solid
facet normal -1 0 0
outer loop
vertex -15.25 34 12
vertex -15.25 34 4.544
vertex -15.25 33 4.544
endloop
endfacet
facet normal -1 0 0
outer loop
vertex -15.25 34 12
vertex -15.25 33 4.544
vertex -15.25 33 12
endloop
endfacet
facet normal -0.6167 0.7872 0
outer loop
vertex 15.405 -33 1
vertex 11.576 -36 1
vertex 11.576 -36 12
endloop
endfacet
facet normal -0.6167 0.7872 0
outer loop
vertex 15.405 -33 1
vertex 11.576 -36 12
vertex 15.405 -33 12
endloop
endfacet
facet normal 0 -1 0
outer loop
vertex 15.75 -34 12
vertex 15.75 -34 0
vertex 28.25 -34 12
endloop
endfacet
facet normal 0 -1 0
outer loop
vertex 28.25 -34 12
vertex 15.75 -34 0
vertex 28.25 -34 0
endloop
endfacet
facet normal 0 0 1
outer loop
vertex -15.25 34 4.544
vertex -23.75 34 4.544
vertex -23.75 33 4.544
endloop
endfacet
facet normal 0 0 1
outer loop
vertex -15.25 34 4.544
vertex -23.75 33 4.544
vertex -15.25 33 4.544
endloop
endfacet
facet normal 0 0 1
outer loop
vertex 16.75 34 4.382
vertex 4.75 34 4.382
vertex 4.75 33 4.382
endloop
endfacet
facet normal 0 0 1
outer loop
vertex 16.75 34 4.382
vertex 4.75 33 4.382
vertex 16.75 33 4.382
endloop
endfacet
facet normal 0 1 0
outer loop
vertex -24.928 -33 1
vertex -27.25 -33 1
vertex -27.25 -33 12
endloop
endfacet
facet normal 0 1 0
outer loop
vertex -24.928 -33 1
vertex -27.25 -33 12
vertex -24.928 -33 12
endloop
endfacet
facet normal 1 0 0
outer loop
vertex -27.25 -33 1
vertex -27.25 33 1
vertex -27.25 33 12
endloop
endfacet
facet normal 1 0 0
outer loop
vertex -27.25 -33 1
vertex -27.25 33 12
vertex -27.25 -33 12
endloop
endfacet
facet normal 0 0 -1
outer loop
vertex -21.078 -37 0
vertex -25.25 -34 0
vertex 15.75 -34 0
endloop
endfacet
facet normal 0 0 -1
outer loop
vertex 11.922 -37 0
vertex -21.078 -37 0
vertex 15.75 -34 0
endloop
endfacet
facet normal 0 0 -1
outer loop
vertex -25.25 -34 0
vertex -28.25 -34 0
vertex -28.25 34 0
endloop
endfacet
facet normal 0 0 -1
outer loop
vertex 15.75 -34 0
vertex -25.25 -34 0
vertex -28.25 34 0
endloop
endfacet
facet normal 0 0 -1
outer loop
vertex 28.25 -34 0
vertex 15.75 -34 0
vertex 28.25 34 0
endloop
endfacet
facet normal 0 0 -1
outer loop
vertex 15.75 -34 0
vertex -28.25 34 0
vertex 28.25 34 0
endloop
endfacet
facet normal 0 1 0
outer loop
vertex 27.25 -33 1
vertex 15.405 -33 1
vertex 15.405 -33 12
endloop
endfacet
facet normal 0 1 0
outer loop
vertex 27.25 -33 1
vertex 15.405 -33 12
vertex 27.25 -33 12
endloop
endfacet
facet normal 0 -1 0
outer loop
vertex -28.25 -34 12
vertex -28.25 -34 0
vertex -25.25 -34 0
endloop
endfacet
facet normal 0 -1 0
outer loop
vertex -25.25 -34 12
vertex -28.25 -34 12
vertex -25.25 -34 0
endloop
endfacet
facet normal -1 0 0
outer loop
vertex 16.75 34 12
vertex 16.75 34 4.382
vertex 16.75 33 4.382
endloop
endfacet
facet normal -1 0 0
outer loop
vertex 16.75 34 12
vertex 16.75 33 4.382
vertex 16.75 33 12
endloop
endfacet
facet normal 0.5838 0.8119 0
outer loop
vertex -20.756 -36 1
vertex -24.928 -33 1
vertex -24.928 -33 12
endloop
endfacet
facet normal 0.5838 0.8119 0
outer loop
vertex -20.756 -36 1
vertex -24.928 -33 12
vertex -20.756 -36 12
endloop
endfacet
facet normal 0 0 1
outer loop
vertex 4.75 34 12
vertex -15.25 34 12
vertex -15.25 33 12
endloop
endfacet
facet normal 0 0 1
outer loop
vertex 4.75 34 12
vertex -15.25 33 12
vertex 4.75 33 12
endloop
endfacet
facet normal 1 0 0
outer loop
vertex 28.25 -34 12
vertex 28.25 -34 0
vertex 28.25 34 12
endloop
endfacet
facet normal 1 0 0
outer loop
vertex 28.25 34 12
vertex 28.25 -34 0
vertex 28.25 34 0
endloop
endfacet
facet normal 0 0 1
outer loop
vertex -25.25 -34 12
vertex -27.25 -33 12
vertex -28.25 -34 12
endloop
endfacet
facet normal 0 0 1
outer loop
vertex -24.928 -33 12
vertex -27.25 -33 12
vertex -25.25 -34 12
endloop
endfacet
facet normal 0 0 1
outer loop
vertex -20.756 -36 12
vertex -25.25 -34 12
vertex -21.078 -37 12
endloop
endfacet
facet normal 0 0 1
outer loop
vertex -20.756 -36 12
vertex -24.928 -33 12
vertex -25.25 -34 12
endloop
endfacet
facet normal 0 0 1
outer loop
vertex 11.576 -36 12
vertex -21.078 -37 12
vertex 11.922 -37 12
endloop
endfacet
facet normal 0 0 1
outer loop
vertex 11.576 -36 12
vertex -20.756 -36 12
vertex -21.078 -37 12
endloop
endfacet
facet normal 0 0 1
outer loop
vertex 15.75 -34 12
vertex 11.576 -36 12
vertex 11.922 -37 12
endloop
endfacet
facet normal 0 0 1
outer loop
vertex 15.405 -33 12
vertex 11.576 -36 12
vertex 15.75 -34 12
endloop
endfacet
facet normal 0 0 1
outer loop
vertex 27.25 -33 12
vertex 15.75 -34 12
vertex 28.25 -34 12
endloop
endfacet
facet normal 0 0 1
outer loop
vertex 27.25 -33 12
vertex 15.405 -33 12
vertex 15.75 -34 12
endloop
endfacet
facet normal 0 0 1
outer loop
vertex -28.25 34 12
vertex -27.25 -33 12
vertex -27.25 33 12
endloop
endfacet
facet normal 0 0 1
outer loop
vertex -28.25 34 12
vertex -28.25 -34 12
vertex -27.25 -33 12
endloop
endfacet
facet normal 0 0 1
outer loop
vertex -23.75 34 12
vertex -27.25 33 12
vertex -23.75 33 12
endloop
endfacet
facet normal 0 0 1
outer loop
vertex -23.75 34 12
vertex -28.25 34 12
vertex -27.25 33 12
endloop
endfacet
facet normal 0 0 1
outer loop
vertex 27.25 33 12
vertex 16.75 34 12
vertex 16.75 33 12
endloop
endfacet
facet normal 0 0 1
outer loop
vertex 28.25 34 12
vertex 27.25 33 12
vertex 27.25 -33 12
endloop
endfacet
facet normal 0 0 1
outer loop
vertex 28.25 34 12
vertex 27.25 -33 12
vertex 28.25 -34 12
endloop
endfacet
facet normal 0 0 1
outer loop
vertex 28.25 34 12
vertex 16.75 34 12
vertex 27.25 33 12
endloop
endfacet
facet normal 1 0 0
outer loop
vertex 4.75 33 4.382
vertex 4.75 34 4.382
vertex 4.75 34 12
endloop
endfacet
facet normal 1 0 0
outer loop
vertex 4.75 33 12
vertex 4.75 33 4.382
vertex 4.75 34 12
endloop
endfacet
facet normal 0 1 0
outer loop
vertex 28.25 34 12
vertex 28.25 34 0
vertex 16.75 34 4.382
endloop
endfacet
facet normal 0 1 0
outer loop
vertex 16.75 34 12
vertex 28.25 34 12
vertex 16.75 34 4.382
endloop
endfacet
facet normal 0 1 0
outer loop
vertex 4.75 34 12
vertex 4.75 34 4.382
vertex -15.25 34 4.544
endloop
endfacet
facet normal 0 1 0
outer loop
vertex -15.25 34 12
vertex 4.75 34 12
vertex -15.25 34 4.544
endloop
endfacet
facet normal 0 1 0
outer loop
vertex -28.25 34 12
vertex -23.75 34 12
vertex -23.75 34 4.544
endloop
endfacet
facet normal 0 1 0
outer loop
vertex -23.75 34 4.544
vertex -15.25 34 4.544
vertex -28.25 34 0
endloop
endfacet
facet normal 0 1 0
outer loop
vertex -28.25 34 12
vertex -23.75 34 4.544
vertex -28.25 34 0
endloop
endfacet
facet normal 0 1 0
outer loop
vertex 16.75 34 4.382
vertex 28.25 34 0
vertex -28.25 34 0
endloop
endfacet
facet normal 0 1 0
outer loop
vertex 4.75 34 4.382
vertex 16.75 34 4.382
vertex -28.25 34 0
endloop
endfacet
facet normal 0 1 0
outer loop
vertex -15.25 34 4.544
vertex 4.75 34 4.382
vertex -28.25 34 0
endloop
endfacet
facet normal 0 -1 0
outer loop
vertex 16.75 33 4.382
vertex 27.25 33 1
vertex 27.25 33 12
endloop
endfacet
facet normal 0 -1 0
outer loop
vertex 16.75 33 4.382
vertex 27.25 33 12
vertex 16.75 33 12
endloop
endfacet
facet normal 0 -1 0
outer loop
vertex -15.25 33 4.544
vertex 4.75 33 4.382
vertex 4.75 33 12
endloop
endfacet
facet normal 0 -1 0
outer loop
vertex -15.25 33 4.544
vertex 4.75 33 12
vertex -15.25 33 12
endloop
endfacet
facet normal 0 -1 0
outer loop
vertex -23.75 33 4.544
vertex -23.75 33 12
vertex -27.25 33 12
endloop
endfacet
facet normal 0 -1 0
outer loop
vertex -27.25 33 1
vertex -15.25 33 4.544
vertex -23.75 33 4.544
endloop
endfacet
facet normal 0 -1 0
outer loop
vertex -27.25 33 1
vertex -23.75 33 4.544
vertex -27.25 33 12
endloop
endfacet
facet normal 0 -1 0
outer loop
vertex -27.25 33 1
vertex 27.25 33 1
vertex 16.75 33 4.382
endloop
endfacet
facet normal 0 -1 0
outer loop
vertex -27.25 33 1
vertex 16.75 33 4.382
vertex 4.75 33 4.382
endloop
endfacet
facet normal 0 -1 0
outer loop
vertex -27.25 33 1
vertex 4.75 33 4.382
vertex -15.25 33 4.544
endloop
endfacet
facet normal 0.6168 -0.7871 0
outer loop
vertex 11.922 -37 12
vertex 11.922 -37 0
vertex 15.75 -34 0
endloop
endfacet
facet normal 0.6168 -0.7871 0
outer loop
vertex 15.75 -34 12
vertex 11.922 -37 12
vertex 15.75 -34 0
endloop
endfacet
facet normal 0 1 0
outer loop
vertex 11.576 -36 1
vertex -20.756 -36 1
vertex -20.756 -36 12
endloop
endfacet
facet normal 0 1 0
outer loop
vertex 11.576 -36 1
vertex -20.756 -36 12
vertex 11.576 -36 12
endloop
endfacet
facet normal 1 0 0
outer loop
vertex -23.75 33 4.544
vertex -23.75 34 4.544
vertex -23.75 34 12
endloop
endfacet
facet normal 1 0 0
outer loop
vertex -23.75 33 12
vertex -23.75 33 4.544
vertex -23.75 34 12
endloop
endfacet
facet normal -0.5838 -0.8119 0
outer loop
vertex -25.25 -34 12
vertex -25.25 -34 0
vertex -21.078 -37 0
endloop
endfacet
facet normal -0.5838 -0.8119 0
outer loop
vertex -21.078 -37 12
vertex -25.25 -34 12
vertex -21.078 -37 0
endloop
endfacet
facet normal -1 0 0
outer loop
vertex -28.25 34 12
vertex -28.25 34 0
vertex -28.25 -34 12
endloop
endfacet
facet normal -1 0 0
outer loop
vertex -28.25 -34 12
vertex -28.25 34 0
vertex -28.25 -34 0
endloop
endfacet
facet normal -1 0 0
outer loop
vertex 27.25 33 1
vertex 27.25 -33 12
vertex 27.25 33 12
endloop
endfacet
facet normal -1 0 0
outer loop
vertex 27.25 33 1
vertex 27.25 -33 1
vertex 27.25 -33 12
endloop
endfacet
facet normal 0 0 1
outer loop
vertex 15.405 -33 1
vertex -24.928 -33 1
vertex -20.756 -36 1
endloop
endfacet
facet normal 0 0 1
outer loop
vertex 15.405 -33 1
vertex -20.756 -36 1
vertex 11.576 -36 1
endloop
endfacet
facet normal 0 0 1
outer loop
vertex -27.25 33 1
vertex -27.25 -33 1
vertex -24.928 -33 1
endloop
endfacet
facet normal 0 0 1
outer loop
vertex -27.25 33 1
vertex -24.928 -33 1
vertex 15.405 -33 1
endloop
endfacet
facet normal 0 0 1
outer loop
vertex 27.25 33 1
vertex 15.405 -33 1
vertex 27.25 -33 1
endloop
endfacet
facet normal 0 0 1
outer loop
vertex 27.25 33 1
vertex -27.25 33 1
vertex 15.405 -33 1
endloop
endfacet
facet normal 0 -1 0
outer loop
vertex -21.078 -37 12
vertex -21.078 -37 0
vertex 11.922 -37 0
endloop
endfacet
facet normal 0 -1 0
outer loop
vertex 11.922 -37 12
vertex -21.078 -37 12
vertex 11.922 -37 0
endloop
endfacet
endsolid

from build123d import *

# Parameters (mm, degrees)
F1_DEPTH = 12
F2_T     = -1
F4_W     = 12
F4_H     = 11
F4_W_2   = 8.5
F5_DEPTH = 5


with BuildPart() as f1:
    # F0 (on Top) → F1 (new body)
    with BuildSketch(Plane.XY):
        Polygon((28.25, 34), (-28.25, 34), (-28.25, -34), (-25.25, -34), (15.75, -34), (28.25, -34), align=None)
        Polygon((15.75, -34), (-25.25, -34), (-21.0784263909, -37), (11.9215736091, -37), align=None)
    extrude(amount=F1_DEPTH)

    # F2
    f2_openings = [f1.faces().sort_by_distance(p)[0] for p in [
        (-0.131058, -0.99532, 12),
    ]]
    offset(amount=F2_T, openings=f2_openings, kind=Kind.INTERSECTION)

    # F4 (on offset) → F5 (cut)
    with BuildSketch(Plane.XZ.offset(-34)):
        with Locations((10.75, 9.8824445456)):
            Rectangle(F4_W, F4_H)
        with Locations((-19.5, 10.0444257557)):
            Rectangle(F4_W_2, F4_H)
    extrude(amount=F5_DEPTH, mode=Mode.SUBTRACT)


solid = f1.part
